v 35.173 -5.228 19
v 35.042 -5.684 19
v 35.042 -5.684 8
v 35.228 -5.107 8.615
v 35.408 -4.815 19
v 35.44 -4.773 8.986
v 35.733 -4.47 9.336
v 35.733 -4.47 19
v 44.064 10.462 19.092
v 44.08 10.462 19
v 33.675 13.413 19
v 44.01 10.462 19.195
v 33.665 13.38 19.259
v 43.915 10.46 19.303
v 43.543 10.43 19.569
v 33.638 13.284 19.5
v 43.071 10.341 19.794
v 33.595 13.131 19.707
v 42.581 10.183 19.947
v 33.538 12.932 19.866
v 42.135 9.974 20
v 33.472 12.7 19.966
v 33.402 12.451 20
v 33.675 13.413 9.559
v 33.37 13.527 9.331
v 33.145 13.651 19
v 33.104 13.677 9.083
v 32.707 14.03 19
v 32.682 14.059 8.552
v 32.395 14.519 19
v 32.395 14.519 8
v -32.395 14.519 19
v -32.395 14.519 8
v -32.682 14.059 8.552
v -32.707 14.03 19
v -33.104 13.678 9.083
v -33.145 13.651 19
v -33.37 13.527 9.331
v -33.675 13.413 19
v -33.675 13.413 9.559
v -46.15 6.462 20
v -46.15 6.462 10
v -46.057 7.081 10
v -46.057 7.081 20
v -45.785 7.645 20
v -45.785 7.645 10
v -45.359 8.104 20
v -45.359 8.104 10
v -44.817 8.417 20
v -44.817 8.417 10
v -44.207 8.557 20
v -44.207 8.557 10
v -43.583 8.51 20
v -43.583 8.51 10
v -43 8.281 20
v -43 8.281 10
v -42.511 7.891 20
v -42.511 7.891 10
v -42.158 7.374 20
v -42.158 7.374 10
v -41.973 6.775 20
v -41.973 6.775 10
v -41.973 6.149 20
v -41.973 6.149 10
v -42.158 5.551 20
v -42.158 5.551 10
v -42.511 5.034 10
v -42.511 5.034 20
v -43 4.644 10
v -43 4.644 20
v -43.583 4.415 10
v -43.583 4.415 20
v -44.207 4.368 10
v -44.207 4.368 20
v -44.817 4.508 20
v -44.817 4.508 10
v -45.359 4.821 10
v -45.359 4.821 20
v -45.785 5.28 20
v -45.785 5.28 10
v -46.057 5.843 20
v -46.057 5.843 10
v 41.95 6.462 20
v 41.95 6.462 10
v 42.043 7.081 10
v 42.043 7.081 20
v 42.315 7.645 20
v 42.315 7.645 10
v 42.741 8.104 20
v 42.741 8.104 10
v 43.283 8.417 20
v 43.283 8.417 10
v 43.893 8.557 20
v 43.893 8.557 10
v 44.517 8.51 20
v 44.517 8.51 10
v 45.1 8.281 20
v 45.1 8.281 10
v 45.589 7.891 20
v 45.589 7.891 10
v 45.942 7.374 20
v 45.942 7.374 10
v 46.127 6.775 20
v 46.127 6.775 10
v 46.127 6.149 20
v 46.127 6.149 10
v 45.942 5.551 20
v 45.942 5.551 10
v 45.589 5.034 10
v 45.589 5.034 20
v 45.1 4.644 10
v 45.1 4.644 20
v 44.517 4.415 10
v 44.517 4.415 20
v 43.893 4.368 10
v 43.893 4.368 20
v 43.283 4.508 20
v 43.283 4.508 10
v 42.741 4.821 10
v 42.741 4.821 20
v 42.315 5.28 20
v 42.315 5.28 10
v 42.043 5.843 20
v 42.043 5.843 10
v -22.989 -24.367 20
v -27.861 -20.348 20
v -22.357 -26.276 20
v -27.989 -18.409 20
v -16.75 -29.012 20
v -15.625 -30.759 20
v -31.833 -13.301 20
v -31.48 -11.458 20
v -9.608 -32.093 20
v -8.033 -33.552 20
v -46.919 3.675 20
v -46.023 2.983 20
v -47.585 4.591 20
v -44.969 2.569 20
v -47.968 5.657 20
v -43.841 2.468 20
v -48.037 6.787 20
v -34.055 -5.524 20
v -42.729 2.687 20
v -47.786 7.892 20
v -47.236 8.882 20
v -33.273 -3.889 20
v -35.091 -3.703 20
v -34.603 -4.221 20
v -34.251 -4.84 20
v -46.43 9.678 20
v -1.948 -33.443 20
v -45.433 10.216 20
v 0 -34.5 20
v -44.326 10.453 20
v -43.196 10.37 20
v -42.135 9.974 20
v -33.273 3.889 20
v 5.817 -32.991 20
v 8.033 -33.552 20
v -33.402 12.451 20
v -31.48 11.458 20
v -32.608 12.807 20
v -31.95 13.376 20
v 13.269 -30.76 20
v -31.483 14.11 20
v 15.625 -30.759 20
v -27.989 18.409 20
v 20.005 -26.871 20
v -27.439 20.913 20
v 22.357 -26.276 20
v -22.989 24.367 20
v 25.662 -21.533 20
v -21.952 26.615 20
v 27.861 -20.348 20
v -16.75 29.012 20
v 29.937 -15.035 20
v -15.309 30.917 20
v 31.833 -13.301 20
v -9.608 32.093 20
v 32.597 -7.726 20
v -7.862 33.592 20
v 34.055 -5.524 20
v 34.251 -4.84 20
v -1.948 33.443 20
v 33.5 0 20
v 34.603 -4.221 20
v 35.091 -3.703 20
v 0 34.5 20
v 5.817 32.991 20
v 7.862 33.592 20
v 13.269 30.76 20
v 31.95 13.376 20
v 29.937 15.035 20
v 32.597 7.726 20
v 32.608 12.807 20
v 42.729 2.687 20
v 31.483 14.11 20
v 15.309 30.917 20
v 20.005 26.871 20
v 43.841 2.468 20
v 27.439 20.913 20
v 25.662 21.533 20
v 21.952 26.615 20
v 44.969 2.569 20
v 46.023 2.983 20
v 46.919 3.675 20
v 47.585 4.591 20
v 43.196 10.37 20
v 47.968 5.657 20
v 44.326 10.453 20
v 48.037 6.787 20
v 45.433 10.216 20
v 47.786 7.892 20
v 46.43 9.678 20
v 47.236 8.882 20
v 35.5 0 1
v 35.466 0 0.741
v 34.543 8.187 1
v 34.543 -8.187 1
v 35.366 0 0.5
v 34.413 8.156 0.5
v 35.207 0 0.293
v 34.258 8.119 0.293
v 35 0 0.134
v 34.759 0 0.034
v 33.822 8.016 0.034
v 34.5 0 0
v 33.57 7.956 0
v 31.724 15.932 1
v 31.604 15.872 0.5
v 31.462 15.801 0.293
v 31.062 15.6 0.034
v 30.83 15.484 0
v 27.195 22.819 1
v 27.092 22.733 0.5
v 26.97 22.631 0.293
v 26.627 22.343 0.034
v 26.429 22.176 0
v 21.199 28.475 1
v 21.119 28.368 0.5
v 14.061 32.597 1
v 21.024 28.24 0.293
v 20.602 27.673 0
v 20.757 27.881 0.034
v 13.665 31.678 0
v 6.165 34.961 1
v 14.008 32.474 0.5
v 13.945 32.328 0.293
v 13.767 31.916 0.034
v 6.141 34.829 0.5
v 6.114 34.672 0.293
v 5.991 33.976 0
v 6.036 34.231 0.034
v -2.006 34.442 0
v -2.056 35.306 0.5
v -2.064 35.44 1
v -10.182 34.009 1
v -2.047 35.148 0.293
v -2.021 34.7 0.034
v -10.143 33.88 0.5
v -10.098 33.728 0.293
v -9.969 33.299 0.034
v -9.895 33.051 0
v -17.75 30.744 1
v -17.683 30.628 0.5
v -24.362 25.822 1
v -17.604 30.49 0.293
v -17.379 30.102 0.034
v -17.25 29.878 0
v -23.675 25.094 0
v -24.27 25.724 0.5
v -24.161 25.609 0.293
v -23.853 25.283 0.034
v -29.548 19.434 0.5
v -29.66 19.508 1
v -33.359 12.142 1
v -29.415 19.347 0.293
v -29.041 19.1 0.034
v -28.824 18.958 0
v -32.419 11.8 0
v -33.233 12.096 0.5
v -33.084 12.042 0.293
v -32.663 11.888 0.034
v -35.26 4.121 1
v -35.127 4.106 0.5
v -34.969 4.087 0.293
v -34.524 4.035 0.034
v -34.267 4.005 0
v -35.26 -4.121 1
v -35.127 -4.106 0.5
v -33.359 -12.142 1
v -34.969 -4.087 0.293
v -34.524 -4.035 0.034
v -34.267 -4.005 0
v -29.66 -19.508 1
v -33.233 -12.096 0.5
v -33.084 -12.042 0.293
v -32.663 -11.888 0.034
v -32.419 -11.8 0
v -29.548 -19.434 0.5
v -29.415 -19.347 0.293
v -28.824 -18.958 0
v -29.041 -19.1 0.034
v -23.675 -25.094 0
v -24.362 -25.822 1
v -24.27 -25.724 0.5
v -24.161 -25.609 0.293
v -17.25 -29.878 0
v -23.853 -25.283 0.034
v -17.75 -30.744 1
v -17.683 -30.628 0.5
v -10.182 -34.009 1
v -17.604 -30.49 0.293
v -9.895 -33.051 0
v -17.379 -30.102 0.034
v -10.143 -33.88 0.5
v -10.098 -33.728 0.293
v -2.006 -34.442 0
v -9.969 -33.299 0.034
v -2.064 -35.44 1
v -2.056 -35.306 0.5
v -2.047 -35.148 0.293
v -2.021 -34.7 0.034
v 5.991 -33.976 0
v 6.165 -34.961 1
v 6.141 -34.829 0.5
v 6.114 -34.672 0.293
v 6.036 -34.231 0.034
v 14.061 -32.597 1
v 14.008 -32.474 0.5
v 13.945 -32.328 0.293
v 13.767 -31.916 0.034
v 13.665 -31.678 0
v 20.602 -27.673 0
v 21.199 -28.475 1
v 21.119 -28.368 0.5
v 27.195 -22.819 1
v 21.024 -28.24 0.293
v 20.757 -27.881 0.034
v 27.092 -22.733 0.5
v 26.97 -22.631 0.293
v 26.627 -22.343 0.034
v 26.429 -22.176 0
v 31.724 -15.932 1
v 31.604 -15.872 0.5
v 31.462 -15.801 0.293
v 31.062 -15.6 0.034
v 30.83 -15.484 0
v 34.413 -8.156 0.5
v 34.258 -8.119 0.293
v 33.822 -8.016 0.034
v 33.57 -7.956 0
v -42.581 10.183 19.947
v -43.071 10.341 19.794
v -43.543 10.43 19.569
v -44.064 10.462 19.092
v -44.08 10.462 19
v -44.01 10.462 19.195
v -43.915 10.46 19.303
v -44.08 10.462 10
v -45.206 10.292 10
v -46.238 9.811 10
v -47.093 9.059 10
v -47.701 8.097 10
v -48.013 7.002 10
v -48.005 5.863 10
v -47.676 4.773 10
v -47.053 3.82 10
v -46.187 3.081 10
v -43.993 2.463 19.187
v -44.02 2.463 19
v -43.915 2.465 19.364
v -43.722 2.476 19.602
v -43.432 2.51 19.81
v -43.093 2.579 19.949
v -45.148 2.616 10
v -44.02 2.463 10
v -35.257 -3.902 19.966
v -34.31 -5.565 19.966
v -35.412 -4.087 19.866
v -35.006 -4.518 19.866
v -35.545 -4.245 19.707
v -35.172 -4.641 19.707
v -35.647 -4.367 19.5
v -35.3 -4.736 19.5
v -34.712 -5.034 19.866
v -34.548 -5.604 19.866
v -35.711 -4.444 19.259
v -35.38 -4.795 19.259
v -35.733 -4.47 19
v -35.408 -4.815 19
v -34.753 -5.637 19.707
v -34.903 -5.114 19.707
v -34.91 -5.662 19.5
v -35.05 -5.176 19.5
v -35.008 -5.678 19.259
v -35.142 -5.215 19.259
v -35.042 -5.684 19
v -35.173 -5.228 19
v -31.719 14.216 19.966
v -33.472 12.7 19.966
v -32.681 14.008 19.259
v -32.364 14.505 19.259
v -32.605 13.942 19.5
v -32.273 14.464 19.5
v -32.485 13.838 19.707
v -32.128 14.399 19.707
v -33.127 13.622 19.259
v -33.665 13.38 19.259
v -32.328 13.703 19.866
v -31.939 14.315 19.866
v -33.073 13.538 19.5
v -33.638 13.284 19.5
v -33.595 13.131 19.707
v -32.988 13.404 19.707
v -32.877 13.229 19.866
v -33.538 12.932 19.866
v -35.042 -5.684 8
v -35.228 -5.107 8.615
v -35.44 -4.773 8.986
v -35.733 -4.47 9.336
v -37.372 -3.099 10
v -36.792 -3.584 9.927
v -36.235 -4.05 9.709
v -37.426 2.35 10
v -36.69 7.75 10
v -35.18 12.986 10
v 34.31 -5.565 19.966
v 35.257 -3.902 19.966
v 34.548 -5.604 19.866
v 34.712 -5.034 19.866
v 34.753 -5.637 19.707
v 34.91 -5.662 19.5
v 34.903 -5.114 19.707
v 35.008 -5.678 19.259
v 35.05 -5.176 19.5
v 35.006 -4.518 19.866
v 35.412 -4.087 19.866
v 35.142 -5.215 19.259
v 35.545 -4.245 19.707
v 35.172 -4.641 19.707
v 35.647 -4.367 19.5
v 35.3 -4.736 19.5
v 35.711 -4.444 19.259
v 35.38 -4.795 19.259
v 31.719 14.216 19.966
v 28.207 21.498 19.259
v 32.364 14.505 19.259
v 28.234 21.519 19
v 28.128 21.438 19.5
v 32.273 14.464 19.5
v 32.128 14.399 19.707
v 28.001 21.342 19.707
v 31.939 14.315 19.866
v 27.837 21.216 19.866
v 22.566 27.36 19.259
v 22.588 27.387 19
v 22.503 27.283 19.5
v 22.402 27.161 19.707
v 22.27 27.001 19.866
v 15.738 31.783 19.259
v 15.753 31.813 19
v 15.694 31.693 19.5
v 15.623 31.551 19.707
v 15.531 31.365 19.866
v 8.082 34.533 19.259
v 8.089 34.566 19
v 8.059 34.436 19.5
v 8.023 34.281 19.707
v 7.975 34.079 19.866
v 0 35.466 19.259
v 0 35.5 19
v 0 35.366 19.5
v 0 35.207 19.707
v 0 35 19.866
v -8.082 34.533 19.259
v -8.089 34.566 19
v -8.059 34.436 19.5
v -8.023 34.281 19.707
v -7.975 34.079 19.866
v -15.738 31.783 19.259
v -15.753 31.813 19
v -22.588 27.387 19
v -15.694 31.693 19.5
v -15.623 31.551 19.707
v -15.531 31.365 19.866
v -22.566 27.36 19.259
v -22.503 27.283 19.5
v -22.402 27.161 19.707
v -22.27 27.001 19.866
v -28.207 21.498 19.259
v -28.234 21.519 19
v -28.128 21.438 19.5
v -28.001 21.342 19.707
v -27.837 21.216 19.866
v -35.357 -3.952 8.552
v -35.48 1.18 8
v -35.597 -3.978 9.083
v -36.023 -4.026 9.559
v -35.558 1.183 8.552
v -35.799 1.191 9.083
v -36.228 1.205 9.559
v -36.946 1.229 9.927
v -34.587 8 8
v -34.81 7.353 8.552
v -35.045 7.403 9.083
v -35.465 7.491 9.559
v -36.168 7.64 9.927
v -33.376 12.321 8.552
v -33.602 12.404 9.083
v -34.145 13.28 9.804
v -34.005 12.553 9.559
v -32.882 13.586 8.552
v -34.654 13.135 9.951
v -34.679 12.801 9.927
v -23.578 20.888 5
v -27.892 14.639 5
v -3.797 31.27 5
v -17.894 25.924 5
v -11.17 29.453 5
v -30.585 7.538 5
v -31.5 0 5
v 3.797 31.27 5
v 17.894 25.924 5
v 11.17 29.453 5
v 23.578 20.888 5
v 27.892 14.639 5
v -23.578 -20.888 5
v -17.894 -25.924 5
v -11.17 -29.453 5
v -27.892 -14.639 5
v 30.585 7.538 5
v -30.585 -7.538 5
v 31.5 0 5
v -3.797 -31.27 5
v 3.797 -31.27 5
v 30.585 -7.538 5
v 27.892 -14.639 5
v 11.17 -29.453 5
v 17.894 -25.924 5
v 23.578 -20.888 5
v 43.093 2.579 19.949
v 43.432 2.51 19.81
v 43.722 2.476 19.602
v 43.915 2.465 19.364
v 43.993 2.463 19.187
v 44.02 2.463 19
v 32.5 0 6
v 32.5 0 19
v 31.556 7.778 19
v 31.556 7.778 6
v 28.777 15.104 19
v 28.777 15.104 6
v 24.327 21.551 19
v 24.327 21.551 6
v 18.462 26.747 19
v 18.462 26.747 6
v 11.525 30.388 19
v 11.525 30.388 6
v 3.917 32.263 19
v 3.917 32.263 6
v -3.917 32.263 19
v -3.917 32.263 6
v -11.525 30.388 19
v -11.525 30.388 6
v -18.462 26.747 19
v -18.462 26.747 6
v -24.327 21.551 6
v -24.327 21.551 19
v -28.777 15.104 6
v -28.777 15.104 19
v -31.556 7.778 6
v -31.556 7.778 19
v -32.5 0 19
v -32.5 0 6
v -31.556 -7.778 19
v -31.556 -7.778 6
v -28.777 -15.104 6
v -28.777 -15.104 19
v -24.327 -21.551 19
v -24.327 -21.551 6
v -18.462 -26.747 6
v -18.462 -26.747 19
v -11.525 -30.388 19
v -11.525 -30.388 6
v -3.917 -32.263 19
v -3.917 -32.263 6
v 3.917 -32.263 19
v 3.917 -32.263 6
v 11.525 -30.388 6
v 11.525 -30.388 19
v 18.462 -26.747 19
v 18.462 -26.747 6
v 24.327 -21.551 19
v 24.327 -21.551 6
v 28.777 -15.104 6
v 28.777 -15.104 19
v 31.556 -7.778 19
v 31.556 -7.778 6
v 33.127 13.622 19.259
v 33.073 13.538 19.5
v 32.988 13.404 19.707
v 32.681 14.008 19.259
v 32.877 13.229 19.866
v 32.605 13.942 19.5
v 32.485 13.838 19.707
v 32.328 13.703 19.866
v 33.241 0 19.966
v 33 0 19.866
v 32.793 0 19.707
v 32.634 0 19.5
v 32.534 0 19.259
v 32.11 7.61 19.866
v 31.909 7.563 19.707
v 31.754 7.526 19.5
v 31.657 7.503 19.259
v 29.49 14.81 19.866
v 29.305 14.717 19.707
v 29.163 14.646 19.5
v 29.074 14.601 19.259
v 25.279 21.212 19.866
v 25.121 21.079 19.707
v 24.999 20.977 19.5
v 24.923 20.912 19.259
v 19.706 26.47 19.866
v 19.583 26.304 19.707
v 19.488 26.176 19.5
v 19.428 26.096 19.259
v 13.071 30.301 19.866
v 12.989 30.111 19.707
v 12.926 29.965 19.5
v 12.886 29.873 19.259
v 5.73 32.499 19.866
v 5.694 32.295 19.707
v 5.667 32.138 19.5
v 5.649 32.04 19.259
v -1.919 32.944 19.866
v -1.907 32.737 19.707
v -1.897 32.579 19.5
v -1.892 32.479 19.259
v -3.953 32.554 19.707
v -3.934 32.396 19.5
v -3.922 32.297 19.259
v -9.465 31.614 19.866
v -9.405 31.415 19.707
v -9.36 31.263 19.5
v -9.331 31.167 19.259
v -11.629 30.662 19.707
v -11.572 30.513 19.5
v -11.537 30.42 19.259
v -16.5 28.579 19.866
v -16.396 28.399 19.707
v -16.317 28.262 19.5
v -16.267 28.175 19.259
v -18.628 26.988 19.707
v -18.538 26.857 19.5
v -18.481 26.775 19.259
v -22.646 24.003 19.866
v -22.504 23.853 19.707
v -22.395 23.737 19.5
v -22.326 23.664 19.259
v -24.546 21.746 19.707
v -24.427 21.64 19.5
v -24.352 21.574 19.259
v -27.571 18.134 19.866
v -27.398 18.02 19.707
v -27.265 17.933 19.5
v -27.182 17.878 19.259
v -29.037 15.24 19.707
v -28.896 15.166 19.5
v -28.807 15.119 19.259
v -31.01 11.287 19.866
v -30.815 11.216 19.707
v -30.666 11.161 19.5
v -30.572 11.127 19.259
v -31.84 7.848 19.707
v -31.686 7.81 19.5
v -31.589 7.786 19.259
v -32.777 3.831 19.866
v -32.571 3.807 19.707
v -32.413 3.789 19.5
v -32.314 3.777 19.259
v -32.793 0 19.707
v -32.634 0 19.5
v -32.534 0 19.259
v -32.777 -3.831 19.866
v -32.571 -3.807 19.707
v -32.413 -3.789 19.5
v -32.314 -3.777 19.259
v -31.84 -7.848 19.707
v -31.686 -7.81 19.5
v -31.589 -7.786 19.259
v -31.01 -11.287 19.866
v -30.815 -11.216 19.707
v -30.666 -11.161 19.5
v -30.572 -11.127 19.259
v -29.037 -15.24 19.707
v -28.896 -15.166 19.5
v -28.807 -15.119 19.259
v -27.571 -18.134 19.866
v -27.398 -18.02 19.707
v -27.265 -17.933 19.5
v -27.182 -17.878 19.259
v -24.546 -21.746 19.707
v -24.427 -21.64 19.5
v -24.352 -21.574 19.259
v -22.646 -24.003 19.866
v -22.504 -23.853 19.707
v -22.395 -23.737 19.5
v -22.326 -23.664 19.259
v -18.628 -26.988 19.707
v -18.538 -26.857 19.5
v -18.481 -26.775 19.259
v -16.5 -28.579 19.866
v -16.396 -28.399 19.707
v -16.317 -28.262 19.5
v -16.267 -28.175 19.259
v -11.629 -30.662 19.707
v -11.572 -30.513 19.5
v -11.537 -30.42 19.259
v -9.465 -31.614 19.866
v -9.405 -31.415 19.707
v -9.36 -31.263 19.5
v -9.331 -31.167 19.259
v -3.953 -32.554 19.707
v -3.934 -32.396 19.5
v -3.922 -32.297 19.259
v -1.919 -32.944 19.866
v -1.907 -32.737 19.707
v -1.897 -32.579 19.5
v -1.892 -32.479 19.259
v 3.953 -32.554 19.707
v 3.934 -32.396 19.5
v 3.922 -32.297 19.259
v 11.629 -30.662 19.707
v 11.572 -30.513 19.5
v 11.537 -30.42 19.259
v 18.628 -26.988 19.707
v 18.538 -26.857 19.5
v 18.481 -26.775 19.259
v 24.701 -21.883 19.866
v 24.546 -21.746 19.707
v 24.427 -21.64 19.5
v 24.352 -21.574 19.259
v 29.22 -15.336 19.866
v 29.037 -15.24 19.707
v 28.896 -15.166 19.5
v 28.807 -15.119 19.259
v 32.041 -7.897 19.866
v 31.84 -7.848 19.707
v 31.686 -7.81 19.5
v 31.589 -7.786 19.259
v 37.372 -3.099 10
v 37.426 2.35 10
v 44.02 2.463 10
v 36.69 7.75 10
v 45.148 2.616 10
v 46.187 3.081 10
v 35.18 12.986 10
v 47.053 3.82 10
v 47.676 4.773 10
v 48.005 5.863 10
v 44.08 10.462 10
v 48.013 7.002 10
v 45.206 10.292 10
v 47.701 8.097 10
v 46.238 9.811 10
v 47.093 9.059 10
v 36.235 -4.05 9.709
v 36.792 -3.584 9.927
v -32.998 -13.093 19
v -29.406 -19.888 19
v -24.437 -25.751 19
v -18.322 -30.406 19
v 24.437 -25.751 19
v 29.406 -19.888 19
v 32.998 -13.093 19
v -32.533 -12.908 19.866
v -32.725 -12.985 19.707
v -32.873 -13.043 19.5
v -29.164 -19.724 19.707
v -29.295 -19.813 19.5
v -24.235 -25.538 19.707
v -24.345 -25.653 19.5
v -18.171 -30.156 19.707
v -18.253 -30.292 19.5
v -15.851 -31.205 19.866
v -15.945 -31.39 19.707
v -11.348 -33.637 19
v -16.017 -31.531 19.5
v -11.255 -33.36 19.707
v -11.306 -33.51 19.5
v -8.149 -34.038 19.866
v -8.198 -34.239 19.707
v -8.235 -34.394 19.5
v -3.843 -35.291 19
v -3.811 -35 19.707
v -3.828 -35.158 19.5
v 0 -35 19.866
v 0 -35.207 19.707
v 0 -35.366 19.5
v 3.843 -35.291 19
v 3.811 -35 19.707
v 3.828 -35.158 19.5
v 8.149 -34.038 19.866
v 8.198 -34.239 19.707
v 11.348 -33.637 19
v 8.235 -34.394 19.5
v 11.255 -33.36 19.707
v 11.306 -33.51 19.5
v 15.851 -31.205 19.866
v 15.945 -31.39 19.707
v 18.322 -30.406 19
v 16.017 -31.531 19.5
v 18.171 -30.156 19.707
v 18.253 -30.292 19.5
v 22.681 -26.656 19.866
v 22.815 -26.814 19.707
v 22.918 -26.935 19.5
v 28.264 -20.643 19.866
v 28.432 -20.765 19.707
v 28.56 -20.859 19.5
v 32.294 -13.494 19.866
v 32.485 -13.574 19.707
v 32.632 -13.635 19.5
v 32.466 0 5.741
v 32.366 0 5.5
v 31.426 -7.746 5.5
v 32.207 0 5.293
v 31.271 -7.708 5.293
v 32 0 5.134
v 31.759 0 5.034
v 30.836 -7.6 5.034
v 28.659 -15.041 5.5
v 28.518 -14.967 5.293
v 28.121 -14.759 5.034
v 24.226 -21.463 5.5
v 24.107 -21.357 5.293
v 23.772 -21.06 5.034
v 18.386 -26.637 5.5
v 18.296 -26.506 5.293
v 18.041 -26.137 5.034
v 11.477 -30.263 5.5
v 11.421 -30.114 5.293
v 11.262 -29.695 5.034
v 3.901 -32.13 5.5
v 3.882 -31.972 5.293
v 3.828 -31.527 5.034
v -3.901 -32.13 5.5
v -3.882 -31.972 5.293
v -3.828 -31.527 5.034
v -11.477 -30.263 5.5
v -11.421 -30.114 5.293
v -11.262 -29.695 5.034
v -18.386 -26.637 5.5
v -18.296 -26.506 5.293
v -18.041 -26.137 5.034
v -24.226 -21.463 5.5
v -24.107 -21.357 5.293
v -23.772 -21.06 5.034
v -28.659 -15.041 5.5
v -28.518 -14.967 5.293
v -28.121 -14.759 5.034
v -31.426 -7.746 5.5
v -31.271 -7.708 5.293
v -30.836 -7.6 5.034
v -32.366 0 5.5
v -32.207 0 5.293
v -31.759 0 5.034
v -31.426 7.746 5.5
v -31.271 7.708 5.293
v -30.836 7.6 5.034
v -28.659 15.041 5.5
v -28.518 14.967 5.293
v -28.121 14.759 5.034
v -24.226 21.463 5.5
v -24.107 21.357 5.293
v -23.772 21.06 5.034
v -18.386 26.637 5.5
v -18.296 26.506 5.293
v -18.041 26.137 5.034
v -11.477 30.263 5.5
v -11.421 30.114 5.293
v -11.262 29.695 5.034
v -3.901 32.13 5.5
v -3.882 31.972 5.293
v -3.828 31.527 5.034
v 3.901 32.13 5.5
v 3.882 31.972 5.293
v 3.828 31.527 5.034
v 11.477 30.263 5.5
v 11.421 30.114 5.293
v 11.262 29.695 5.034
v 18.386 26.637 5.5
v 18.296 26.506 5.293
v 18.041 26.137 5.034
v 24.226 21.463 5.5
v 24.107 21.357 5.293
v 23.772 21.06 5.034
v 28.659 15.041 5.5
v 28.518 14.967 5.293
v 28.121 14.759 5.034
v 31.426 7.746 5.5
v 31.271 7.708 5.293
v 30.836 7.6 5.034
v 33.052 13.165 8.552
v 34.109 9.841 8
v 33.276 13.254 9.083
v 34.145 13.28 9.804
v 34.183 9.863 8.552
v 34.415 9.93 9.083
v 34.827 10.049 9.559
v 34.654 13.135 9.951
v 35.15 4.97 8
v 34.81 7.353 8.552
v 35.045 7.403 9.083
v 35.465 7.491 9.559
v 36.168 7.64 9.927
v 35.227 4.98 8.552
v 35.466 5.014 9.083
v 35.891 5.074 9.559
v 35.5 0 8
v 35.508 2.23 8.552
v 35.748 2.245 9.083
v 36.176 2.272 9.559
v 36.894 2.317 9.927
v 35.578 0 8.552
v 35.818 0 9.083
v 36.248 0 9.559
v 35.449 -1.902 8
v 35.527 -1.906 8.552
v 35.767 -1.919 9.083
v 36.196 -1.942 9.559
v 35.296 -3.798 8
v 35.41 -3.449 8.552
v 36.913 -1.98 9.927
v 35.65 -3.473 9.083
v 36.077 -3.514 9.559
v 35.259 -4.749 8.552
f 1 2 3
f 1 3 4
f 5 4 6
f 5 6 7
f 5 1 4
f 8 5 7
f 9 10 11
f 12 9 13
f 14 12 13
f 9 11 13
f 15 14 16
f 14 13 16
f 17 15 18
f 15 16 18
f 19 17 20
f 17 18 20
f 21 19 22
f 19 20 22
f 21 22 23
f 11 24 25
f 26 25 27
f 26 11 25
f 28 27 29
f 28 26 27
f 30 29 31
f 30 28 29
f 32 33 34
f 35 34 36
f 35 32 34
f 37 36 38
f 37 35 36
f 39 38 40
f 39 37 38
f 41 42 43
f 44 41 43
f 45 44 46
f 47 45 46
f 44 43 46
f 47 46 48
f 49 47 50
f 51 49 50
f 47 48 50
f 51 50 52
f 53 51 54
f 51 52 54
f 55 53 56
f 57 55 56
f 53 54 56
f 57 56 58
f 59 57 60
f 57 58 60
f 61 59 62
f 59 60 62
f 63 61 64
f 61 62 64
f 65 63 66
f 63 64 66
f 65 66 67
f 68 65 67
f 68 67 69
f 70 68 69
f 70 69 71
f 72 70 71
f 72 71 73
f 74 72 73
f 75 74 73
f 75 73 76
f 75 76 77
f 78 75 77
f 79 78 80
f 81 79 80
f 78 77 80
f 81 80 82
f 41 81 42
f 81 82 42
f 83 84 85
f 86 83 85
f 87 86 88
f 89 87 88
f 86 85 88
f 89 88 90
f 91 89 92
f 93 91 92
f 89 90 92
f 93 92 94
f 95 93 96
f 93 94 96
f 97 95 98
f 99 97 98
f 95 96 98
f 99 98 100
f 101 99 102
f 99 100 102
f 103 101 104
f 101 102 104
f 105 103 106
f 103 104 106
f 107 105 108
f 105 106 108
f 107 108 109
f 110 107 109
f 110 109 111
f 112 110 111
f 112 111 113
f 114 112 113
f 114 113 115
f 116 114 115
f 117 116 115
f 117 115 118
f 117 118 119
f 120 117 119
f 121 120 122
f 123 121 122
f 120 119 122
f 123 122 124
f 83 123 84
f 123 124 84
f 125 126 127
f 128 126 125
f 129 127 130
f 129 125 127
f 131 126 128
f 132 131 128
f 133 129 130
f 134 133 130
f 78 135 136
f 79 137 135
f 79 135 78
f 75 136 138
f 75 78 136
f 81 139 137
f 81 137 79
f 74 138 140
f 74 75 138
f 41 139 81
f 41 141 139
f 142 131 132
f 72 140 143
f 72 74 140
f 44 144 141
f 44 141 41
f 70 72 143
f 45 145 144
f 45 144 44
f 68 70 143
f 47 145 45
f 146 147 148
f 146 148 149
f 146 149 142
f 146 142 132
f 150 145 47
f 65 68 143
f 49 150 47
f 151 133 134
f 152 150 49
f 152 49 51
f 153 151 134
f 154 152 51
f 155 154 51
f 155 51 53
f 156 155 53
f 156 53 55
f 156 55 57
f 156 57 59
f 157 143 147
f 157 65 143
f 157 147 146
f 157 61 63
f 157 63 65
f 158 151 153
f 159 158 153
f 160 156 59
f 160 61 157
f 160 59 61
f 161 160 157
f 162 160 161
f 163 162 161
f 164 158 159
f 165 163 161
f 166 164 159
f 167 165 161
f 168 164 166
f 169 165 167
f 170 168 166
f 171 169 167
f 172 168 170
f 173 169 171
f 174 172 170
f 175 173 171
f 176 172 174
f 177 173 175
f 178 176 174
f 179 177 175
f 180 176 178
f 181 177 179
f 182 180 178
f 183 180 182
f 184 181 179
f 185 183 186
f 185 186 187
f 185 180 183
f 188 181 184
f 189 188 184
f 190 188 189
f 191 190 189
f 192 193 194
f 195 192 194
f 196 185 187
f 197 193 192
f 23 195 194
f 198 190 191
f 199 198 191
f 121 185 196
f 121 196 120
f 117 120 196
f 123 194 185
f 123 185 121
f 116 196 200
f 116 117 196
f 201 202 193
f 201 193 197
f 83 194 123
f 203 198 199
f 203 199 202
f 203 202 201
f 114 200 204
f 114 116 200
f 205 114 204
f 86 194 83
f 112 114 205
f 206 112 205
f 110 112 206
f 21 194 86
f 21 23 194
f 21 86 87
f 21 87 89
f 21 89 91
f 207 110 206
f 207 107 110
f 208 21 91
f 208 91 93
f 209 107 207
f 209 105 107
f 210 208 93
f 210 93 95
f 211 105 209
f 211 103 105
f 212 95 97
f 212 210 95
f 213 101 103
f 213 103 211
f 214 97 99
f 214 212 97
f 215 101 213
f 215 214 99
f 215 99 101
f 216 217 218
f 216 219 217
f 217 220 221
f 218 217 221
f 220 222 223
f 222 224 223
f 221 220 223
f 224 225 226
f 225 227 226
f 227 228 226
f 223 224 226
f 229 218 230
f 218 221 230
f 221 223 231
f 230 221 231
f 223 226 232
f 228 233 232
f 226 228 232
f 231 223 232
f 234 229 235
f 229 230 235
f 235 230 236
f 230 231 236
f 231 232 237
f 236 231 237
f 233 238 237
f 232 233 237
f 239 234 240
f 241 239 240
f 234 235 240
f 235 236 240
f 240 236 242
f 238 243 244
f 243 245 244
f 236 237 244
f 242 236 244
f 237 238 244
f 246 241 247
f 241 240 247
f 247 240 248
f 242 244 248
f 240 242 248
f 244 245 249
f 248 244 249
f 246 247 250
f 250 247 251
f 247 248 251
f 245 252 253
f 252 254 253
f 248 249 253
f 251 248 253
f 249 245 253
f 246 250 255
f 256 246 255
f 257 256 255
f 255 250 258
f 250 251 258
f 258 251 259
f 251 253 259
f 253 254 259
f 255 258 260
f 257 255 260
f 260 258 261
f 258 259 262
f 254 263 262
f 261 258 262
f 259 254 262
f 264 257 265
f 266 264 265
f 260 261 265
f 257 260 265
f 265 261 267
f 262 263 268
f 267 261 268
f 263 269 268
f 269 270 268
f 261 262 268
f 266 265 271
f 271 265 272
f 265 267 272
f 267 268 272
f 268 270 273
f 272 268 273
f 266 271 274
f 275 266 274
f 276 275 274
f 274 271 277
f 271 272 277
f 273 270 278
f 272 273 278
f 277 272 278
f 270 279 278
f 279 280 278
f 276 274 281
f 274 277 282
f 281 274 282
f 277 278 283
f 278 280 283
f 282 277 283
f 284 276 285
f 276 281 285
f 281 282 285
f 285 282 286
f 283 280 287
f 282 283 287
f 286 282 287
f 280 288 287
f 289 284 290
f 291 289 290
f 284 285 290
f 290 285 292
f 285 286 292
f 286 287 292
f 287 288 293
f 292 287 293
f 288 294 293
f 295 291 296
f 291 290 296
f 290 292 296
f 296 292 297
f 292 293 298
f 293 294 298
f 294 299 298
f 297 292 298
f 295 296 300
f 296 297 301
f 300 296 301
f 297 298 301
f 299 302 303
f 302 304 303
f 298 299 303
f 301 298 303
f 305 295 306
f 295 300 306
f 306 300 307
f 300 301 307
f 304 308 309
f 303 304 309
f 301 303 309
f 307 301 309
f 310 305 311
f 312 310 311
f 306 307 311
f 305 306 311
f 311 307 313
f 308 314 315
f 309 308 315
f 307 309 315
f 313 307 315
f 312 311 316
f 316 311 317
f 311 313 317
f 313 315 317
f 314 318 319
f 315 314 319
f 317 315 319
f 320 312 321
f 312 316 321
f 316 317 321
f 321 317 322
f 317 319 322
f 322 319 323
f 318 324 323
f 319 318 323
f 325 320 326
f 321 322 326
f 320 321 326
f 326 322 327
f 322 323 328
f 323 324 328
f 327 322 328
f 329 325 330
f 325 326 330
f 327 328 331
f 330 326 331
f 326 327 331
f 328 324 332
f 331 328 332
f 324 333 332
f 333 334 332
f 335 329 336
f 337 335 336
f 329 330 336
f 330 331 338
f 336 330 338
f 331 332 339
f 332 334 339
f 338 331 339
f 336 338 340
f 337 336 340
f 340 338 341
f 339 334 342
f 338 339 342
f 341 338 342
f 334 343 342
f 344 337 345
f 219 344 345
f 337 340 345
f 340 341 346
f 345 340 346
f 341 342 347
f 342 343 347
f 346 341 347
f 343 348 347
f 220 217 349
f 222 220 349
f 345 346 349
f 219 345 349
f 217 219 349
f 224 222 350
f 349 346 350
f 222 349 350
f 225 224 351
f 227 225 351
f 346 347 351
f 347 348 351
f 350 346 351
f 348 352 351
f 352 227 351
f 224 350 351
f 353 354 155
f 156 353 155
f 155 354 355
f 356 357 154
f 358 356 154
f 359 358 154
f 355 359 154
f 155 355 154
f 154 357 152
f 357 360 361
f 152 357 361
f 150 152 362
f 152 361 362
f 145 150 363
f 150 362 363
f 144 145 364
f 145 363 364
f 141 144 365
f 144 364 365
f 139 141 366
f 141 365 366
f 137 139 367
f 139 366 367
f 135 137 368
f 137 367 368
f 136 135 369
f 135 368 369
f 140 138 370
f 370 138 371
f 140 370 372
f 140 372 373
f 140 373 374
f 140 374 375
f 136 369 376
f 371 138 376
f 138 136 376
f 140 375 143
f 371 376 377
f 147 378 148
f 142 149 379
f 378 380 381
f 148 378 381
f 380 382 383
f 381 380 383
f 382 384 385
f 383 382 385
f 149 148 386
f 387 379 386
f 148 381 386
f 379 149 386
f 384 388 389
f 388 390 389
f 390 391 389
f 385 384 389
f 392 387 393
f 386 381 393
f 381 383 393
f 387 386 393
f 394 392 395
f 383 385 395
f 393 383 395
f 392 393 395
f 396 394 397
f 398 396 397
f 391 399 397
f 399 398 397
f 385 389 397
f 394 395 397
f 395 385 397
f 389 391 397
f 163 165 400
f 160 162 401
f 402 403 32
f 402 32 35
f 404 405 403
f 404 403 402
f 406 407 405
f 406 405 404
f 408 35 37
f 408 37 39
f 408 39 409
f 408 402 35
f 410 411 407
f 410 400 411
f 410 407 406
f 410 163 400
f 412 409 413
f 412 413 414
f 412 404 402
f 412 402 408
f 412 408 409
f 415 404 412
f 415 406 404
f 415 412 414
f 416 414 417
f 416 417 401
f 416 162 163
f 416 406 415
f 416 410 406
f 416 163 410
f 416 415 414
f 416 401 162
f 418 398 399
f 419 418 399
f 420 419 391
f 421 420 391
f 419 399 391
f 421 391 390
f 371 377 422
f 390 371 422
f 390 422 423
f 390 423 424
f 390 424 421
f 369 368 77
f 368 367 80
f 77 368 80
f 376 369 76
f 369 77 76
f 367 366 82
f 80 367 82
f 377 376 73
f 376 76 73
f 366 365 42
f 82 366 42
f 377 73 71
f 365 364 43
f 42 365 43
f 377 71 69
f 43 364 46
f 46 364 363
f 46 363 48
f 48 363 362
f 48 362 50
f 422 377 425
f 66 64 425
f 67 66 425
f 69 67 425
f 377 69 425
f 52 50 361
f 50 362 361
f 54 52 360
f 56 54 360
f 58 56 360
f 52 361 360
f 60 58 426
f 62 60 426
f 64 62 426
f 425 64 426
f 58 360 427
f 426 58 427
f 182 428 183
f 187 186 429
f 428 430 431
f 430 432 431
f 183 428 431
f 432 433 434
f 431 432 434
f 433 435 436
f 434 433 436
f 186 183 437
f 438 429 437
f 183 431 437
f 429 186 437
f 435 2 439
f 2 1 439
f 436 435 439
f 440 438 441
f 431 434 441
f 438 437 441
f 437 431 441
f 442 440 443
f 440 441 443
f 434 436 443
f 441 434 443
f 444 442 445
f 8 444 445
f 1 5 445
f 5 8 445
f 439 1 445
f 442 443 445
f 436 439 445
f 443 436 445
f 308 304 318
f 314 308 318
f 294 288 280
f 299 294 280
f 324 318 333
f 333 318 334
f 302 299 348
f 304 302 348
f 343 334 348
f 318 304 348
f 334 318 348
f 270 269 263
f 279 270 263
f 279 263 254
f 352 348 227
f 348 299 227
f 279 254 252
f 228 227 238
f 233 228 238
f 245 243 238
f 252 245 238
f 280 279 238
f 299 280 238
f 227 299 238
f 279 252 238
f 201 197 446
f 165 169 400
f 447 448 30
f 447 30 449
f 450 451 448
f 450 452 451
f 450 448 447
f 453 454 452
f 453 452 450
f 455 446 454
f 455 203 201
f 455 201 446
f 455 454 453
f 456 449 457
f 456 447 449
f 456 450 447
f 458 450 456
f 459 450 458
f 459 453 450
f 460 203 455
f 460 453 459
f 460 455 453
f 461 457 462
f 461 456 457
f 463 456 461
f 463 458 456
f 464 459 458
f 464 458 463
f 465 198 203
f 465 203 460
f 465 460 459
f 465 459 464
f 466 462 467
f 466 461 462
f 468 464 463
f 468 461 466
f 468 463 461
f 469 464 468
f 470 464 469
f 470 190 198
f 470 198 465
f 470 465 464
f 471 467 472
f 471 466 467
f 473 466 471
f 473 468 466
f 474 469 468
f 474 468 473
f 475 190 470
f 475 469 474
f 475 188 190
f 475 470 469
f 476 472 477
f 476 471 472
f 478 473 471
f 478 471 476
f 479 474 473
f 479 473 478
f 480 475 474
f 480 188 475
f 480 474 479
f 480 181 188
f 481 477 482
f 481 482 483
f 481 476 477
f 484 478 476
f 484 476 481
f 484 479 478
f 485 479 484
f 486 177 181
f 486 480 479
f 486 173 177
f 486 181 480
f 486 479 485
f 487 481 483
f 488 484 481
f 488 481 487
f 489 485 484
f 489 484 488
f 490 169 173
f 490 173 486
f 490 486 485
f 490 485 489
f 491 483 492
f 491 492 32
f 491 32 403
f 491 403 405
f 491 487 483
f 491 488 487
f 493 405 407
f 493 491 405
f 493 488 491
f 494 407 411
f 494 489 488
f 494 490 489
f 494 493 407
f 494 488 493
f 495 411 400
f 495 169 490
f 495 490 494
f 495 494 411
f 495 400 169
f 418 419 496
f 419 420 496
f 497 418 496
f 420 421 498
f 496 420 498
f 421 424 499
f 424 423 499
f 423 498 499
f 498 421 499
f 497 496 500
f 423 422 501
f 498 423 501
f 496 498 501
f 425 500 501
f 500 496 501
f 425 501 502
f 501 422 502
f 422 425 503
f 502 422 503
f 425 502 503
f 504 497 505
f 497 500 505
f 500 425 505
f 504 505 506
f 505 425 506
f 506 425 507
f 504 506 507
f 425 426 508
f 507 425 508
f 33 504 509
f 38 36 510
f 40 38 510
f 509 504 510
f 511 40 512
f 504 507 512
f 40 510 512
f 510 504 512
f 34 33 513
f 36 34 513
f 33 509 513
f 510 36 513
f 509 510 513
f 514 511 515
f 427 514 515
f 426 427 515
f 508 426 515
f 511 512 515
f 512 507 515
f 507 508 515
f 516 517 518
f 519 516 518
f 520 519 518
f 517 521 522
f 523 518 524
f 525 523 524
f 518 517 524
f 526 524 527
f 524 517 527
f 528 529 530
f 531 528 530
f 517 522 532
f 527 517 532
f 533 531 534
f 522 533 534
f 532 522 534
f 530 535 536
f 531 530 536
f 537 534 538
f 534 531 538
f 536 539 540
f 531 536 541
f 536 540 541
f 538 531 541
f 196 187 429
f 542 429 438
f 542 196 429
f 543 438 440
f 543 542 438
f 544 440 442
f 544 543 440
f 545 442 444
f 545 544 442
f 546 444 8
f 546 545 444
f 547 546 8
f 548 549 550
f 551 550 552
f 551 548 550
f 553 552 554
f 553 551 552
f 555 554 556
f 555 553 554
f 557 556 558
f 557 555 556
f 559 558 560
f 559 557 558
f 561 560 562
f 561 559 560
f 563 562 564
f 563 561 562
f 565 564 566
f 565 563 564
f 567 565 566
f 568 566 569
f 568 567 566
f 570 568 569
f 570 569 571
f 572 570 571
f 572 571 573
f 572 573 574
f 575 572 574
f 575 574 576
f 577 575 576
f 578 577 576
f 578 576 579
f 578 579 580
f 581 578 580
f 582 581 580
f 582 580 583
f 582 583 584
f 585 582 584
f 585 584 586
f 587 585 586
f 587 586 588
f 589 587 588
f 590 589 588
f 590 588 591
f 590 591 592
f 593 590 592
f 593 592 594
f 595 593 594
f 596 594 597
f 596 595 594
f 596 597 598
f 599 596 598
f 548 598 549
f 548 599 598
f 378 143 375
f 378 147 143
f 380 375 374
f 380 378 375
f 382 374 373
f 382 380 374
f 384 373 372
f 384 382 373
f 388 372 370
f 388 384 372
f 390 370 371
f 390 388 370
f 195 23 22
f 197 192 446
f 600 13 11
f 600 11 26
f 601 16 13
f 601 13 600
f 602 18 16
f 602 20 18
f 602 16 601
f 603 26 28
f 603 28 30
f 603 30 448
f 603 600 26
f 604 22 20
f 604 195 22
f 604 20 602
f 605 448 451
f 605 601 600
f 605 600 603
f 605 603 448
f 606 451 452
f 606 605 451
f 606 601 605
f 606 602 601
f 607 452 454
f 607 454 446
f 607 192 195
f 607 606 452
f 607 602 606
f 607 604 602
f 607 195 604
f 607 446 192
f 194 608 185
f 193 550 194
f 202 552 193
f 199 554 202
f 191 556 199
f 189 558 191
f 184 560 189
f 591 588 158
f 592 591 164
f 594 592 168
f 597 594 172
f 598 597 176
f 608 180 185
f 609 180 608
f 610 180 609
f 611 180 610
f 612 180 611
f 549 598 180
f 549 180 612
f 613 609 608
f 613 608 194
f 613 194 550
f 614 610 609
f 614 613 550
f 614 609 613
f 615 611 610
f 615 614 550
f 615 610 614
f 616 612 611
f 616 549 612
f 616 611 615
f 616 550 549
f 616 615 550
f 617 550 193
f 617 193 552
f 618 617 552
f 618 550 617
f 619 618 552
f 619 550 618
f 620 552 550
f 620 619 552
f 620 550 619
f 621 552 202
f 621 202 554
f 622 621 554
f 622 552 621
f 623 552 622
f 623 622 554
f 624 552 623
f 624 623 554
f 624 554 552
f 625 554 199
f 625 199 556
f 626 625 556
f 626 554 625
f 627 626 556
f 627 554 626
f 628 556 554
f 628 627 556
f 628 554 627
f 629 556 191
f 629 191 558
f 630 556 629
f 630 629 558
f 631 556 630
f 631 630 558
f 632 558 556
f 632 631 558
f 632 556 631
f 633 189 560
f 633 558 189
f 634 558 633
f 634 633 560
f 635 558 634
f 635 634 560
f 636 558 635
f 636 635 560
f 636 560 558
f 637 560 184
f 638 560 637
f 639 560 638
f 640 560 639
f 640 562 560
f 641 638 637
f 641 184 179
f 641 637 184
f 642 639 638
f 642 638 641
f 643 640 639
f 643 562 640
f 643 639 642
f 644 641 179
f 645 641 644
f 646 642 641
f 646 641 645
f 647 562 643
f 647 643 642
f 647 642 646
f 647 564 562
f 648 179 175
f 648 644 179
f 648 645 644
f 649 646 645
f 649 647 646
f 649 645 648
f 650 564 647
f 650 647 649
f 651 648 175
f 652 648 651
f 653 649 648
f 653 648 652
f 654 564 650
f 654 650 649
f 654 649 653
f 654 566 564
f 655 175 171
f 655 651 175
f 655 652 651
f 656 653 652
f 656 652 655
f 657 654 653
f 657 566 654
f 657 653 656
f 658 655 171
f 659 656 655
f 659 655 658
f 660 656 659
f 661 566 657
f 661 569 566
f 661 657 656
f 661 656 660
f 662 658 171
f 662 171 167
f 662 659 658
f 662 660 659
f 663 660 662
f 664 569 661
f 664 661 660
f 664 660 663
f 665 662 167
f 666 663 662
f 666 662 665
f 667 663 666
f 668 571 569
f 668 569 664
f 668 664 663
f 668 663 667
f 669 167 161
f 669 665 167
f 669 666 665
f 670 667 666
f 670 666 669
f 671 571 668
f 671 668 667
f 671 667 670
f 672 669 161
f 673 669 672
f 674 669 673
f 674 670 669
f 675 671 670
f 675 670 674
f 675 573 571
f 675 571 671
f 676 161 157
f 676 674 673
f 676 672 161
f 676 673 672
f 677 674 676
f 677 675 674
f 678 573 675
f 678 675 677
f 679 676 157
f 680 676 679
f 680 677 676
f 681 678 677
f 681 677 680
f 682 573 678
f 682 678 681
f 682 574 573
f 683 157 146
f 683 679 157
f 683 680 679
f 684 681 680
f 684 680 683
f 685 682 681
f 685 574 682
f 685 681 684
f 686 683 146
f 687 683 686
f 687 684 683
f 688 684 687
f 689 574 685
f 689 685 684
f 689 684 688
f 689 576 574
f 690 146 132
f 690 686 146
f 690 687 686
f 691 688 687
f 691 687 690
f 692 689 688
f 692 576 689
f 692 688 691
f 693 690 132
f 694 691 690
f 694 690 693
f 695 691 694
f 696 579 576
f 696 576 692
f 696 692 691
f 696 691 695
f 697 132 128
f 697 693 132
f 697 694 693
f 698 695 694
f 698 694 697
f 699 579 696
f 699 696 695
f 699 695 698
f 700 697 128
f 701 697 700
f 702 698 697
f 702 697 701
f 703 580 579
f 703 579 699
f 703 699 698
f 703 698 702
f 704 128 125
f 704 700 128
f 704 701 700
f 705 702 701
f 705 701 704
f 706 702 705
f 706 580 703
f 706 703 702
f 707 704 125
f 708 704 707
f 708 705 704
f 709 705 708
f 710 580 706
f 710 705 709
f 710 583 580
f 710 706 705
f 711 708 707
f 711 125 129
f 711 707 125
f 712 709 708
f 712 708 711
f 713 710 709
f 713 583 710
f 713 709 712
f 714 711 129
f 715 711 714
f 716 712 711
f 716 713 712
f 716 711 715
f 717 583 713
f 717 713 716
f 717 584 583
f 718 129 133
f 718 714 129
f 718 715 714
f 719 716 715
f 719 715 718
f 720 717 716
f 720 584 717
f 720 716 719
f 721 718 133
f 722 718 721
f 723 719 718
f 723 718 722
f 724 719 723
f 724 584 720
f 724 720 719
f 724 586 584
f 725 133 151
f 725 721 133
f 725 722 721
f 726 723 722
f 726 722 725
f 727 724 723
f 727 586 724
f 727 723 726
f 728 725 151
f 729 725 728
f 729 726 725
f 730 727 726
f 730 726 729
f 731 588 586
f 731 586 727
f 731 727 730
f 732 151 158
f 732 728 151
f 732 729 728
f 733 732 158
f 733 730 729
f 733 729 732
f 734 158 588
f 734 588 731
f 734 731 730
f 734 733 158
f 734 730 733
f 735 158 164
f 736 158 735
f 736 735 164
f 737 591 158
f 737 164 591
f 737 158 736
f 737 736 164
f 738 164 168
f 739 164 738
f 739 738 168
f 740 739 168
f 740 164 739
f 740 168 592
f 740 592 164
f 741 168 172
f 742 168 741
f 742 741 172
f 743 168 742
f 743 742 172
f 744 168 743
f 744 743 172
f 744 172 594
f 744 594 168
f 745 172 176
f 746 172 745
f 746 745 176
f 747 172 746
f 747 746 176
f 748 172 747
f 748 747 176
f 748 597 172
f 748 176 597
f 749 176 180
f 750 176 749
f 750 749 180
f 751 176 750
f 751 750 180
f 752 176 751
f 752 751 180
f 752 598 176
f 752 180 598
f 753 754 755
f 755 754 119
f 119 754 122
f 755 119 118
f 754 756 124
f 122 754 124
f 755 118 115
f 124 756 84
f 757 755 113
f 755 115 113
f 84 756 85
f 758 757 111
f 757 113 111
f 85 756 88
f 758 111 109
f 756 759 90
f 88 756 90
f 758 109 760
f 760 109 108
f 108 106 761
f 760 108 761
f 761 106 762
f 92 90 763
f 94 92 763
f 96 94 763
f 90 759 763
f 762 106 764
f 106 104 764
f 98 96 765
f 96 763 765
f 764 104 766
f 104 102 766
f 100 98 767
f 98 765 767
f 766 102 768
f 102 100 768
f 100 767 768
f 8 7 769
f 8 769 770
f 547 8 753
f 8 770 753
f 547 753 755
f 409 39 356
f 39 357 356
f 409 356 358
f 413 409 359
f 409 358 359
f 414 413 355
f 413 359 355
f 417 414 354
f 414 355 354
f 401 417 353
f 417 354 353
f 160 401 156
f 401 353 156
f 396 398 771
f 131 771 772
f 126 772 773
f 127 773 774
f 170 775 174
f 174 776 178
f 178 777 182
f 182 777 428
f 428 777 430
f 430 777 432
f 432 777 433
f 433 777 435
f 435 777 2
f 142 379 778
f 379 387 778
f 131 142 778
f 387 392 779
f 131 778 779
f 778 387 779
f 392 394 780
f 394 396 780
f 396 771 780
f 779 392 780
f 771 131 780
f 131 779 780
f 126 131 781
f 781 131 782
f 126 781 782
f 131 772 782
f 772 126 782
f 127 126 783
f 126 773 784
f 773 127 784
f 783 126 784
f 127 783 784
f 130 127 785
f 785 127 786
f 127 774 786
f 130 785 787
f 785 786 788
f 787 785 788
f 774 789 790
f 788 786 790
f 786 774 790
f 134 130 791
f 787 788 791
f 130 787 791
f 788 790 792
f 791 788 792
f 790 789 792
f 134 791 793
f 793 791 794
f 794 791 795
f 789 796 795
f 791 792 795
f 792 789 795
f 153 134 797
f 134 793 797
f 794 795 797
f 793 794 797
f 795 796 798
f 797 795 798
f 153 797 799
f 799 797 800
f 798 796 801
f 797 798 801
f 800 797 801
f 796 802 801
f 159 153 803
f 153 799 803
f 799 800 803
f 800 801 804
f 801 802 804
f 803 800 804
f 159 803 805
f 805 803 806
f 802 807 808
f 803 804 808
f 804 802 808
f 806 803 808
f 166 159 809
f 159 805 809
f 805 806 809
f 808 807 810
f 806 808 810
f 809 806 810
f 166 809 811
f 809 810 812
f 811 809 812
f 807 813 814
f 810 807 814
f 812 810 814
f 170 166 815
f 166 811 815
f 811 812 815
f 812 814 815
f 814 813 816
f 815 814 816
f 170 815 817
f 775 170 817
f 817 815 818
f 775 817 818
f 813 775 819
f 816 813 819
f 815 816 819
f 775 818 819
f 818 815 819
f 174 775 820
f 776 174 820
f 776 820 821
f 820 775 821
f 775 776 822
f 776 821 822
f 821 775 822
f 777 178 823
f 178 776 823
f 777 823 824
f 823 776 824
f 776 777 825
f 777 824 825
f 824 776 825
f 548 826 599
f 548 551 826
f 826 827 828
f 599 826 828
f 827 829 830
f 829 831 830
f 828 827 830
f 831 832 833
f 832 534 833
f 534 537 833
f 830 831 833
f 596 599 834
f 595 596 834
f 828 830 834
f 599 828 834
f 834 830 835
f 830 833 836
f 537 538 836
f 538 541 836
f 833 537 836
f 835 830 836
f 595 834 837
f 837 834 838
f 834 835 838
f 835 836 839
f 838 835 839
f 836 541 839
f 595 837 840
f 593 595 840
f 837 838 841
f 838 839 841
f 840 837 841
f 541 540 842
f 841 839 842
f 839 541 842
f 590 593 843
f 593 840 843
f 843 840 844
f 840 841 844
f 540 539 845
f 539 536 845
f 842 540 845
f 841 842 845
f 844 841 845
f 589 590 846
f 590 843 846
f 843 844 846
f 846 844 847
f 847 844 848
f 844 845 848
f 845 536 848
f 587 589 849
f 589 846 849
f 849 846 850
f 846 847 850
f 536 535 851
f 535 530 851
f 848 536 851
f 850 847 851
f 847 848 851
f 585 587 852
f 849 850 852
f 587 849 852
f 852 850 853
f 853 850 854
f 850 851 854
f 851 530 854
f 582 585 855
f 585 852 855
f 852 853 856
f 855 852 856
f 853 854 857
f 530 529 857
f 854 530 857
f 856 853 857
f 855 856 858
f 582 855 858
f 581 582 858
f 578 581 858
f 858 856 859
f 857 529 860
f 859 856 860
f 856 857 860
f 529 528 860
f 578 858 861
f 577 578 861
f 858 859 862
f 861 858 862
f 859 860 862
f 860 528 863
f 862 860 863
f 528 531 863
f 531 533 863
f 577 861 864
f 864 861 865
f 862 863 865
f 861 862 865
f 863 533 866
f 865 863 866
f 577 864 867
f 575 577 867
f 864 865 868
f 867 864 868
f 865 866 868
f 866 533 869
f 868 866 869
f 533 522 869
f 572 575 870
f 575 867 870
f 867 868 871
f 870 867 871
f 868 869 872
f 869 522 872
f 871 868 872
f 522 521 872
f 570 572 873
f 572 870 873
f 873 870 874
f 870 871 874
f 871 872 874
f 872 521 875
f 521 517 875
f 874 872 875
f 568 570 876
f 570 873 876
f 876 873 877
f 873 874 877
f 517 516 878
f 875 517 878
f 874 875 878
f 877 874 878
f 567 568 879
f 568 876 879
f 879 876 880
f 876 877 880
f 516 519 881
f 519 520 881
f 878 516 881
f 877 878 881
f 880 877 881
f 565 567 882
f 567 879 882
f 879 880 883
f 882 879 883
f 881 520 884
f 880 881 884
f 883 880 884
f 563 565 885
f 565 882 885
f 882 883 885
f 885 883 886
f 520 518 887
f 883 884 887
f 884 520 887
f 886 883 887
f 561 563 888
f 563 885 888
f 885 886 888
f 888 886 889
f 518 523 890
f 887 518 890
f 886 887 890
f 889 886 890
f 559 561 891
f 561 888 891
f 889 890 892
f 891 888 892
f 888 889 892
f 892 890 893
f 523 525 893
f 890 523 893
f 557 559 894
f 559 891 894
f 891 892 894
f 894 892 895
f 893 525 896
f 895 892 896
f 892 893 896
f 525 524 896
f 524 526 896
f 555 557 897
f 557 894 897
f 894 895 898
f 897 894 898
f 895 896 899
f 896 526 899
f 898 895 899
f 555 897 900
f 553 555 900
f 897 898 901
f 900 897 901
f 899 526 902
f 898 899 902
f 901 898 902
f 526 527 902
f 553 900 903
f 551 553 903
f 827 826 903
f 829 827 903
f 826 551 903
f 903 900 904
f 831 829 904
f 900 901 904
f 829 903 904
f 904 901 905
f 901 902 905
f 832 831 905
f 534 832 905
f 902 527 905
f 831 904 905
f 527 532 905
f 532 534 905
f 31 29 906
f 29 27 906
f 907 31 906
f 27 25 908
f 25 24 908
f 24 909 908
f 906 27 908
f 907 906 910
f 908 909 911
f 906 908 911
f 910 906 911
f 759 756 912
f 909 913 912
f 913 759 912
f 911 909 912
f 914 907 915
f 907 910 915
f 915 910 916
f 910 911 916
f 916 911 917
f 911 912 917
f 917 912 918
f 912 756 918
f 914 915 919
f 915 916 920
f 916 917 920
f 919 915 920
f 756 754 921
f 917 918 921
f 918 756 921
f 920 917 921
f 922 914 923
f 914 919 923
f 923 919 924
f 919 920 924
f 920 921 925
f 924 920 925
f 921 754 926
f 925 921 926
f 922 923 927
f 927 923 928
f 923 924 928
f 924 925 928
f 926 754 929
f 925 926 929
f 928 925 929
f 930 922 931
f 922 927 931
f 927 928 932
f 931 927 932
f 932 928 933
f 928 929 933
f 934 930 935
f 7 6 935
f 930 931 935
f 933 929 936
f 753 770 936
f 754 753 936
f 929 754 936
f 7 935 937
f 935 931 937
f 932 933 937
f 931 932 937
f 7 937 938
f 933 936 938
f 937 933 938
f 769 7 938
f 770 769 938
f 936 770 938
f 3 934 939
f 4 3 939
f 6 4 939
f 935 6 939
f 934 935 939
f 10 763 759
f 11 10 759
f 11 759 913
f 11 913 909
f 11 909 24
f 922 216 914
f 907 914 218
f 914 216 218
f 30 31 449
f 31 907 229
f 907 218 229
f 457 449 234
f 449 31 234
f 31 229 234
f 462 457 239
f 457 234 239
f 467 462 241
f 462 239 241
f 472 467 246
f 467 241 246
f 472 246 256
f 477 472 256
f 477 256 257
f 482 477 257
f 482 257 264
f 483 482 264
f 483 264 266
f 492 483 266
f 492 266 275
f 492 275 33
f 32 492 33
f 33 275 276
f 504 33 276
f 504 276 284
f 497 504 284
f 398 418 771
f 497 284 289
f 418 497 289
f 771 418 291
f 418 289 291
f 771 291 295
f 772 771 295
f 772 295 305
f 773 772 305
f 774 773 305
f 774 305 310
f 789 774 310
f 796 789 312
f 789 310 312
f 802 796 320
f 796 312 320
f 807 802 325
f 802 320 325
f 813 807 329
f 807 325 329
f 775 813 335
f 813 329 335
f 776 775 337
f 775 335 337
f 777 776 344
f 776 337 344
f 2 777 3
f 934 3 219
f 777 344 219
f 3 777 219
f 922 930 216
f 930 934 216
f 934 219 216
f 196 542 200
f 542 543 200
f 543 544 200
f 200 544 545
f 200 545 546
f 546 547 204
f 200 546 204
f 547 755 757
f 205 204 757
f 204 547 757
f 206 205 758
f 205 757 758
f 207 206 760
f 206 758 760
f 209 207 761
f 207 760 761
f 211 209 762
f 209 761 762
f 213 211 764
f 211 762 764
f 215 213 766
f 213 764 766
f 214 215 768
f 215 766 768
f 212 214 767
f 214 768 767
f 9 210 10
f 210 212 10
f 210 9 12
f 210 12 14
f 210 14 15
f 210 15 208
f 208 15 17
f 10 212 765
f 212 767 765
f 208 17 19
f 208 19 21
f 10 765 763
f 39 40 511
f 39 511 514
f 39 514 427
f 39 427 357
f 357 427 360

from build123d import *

# Parameters (mm, degrees)
SKETCH1_R           = 35.5
SKETCH1_R_2         = 32.5
BOSS_EXTRUDE1_DEPTH = 20
SKETCH2_R           = 35.5
BOSS_EXTRUDE2_DEPTH = 5
BOSS_EXTRUDE5_START = -10
BOSS_EXTRUDE5_DEPTH = 10
SKETCH6_R           = 2.1
CUT_EXTRUDE1_DEPTH  = 10
FILLET1_R           = 2
FILLET2_R           = 1


with BuildPart() as part:
    # Sketch1 → Boss-Extrude1 (new body)
    with BuildSketch(Plane.XY):
        Circle(SKETCH1_R)
        Circle(SKETCH1_R_2, mode=Mode.SUBTRACT)
    extrude(amount=BOSS_EXTRUDE1_DEPTH)

    # Sketch2 → Boss-Extrude2 (add)
    with BuildSketch(Plane(origin=(0, 0, 0), x_dir=(-1, 0, 0), z_dir=(0, 0, -1))):
        with Locations(Location((0, 0, 0), (0, 0, 180))):
            Circle(SKETCH2_R)
    extrude(amount=-BOSS_EXTRUDE2_DEPTH)

    # Sketch5 → Boss-Extrude5 (add)
    with BuildSketch(Plane.XY.offset(20).offset(BOSS_EXTRUDE5_START)):
        with BuildLine():
            Line((-44.01983555, 2.462594057), (-35.152395855, -4.955710406))
            ThreePointArc((-35.152395855, -4.955710406), (-35.21119146, 4.519070252), (-32.761689436, 13.671931294))
            Line((-32.761689436, 13.671931294), (-44.080202136, 10.462366296))
            ThreePointArc((-44.080202136, 10.462366296), (-48.049904962, 6.432296883), (-44.01983555, 2.462594057))
        make_face()
        with BuildLine():
            Line((44.080202136, 10.462366296), (32.761689436, 13.671931294))
            ThreePointArc((32.761689436, 13.671931294), (35.21119146, 4.519070252), (35.152395855, -4.955710406))
            Line((35.152395855, -4.955710406), (44.01983555, 2.462594057))
            ThreePointArc((44.01983555, 2.462594057), (48.049904962, 6.432296883), (44.080202136, 10.462366296))
        make_face()
    extrude(amount=BOSS_EXTRUDE5_DEPTH)

    # Sketch6 → Cut-Extrude1 (cut)
    with BuildSketch(Plane(origin=(0, 0, 10), x_dir=(-1, 0, 0), z_dir=(0, 0, -1))):
        with Locations((-44.050018843, 6.462480176)):
            Circle(SKETCH6_R)
        with Locations((44.050018843, 6.462480176)):
            Circle(SKETCH6_R)
    extrude(amount=-CUT_EXTRUDE1_DEPTH, mode=Mode.SUBTRACT)

    # Fillet1
    fillet1_edges = [part.edges().sort_by_distance(p)[0] for p in [
        (-35.21119146, 4.519070252, 10),
        (-32.761689436, 13.671931294, 15),
        (-35.152395855, -4.955710406, 15),
        (34.808691264, 6.971729521, 10),
        (35.152395855, -4.955710406, 15),
        (32.761689436, 13.671931294, 15),
    ]]
    fillet(fillet1_edges, radius=FILLET1_R)

    # Fillet2
    fillet2_edges = [part.edges().sort_by_distance(p)[0] for p in [
        (-32.5, 0, 5),
        (-35.5, 0, 0),
        (-39.876382255, -1.003727579, 20),
        (38.877374536, 11.937720328, 20),
        (0, -35.5, 20),
        (0, 35.5, 20),
        (-32.5, 0, 20),
        (-38.877374536, 11.937720328, 20),
        (39.876382255, -1.003727579, 20),
        (-35.278088778, -5.014669945, 20),
        (-32.912138626, 13.824247135, 20),
        (32.912138626, 13.824247135, 20),
        (35.278088778, -5.014669945, 20),
    ]]
    fillet(fillet2_edges, radius=FILLET2_R)


solid = part.part
